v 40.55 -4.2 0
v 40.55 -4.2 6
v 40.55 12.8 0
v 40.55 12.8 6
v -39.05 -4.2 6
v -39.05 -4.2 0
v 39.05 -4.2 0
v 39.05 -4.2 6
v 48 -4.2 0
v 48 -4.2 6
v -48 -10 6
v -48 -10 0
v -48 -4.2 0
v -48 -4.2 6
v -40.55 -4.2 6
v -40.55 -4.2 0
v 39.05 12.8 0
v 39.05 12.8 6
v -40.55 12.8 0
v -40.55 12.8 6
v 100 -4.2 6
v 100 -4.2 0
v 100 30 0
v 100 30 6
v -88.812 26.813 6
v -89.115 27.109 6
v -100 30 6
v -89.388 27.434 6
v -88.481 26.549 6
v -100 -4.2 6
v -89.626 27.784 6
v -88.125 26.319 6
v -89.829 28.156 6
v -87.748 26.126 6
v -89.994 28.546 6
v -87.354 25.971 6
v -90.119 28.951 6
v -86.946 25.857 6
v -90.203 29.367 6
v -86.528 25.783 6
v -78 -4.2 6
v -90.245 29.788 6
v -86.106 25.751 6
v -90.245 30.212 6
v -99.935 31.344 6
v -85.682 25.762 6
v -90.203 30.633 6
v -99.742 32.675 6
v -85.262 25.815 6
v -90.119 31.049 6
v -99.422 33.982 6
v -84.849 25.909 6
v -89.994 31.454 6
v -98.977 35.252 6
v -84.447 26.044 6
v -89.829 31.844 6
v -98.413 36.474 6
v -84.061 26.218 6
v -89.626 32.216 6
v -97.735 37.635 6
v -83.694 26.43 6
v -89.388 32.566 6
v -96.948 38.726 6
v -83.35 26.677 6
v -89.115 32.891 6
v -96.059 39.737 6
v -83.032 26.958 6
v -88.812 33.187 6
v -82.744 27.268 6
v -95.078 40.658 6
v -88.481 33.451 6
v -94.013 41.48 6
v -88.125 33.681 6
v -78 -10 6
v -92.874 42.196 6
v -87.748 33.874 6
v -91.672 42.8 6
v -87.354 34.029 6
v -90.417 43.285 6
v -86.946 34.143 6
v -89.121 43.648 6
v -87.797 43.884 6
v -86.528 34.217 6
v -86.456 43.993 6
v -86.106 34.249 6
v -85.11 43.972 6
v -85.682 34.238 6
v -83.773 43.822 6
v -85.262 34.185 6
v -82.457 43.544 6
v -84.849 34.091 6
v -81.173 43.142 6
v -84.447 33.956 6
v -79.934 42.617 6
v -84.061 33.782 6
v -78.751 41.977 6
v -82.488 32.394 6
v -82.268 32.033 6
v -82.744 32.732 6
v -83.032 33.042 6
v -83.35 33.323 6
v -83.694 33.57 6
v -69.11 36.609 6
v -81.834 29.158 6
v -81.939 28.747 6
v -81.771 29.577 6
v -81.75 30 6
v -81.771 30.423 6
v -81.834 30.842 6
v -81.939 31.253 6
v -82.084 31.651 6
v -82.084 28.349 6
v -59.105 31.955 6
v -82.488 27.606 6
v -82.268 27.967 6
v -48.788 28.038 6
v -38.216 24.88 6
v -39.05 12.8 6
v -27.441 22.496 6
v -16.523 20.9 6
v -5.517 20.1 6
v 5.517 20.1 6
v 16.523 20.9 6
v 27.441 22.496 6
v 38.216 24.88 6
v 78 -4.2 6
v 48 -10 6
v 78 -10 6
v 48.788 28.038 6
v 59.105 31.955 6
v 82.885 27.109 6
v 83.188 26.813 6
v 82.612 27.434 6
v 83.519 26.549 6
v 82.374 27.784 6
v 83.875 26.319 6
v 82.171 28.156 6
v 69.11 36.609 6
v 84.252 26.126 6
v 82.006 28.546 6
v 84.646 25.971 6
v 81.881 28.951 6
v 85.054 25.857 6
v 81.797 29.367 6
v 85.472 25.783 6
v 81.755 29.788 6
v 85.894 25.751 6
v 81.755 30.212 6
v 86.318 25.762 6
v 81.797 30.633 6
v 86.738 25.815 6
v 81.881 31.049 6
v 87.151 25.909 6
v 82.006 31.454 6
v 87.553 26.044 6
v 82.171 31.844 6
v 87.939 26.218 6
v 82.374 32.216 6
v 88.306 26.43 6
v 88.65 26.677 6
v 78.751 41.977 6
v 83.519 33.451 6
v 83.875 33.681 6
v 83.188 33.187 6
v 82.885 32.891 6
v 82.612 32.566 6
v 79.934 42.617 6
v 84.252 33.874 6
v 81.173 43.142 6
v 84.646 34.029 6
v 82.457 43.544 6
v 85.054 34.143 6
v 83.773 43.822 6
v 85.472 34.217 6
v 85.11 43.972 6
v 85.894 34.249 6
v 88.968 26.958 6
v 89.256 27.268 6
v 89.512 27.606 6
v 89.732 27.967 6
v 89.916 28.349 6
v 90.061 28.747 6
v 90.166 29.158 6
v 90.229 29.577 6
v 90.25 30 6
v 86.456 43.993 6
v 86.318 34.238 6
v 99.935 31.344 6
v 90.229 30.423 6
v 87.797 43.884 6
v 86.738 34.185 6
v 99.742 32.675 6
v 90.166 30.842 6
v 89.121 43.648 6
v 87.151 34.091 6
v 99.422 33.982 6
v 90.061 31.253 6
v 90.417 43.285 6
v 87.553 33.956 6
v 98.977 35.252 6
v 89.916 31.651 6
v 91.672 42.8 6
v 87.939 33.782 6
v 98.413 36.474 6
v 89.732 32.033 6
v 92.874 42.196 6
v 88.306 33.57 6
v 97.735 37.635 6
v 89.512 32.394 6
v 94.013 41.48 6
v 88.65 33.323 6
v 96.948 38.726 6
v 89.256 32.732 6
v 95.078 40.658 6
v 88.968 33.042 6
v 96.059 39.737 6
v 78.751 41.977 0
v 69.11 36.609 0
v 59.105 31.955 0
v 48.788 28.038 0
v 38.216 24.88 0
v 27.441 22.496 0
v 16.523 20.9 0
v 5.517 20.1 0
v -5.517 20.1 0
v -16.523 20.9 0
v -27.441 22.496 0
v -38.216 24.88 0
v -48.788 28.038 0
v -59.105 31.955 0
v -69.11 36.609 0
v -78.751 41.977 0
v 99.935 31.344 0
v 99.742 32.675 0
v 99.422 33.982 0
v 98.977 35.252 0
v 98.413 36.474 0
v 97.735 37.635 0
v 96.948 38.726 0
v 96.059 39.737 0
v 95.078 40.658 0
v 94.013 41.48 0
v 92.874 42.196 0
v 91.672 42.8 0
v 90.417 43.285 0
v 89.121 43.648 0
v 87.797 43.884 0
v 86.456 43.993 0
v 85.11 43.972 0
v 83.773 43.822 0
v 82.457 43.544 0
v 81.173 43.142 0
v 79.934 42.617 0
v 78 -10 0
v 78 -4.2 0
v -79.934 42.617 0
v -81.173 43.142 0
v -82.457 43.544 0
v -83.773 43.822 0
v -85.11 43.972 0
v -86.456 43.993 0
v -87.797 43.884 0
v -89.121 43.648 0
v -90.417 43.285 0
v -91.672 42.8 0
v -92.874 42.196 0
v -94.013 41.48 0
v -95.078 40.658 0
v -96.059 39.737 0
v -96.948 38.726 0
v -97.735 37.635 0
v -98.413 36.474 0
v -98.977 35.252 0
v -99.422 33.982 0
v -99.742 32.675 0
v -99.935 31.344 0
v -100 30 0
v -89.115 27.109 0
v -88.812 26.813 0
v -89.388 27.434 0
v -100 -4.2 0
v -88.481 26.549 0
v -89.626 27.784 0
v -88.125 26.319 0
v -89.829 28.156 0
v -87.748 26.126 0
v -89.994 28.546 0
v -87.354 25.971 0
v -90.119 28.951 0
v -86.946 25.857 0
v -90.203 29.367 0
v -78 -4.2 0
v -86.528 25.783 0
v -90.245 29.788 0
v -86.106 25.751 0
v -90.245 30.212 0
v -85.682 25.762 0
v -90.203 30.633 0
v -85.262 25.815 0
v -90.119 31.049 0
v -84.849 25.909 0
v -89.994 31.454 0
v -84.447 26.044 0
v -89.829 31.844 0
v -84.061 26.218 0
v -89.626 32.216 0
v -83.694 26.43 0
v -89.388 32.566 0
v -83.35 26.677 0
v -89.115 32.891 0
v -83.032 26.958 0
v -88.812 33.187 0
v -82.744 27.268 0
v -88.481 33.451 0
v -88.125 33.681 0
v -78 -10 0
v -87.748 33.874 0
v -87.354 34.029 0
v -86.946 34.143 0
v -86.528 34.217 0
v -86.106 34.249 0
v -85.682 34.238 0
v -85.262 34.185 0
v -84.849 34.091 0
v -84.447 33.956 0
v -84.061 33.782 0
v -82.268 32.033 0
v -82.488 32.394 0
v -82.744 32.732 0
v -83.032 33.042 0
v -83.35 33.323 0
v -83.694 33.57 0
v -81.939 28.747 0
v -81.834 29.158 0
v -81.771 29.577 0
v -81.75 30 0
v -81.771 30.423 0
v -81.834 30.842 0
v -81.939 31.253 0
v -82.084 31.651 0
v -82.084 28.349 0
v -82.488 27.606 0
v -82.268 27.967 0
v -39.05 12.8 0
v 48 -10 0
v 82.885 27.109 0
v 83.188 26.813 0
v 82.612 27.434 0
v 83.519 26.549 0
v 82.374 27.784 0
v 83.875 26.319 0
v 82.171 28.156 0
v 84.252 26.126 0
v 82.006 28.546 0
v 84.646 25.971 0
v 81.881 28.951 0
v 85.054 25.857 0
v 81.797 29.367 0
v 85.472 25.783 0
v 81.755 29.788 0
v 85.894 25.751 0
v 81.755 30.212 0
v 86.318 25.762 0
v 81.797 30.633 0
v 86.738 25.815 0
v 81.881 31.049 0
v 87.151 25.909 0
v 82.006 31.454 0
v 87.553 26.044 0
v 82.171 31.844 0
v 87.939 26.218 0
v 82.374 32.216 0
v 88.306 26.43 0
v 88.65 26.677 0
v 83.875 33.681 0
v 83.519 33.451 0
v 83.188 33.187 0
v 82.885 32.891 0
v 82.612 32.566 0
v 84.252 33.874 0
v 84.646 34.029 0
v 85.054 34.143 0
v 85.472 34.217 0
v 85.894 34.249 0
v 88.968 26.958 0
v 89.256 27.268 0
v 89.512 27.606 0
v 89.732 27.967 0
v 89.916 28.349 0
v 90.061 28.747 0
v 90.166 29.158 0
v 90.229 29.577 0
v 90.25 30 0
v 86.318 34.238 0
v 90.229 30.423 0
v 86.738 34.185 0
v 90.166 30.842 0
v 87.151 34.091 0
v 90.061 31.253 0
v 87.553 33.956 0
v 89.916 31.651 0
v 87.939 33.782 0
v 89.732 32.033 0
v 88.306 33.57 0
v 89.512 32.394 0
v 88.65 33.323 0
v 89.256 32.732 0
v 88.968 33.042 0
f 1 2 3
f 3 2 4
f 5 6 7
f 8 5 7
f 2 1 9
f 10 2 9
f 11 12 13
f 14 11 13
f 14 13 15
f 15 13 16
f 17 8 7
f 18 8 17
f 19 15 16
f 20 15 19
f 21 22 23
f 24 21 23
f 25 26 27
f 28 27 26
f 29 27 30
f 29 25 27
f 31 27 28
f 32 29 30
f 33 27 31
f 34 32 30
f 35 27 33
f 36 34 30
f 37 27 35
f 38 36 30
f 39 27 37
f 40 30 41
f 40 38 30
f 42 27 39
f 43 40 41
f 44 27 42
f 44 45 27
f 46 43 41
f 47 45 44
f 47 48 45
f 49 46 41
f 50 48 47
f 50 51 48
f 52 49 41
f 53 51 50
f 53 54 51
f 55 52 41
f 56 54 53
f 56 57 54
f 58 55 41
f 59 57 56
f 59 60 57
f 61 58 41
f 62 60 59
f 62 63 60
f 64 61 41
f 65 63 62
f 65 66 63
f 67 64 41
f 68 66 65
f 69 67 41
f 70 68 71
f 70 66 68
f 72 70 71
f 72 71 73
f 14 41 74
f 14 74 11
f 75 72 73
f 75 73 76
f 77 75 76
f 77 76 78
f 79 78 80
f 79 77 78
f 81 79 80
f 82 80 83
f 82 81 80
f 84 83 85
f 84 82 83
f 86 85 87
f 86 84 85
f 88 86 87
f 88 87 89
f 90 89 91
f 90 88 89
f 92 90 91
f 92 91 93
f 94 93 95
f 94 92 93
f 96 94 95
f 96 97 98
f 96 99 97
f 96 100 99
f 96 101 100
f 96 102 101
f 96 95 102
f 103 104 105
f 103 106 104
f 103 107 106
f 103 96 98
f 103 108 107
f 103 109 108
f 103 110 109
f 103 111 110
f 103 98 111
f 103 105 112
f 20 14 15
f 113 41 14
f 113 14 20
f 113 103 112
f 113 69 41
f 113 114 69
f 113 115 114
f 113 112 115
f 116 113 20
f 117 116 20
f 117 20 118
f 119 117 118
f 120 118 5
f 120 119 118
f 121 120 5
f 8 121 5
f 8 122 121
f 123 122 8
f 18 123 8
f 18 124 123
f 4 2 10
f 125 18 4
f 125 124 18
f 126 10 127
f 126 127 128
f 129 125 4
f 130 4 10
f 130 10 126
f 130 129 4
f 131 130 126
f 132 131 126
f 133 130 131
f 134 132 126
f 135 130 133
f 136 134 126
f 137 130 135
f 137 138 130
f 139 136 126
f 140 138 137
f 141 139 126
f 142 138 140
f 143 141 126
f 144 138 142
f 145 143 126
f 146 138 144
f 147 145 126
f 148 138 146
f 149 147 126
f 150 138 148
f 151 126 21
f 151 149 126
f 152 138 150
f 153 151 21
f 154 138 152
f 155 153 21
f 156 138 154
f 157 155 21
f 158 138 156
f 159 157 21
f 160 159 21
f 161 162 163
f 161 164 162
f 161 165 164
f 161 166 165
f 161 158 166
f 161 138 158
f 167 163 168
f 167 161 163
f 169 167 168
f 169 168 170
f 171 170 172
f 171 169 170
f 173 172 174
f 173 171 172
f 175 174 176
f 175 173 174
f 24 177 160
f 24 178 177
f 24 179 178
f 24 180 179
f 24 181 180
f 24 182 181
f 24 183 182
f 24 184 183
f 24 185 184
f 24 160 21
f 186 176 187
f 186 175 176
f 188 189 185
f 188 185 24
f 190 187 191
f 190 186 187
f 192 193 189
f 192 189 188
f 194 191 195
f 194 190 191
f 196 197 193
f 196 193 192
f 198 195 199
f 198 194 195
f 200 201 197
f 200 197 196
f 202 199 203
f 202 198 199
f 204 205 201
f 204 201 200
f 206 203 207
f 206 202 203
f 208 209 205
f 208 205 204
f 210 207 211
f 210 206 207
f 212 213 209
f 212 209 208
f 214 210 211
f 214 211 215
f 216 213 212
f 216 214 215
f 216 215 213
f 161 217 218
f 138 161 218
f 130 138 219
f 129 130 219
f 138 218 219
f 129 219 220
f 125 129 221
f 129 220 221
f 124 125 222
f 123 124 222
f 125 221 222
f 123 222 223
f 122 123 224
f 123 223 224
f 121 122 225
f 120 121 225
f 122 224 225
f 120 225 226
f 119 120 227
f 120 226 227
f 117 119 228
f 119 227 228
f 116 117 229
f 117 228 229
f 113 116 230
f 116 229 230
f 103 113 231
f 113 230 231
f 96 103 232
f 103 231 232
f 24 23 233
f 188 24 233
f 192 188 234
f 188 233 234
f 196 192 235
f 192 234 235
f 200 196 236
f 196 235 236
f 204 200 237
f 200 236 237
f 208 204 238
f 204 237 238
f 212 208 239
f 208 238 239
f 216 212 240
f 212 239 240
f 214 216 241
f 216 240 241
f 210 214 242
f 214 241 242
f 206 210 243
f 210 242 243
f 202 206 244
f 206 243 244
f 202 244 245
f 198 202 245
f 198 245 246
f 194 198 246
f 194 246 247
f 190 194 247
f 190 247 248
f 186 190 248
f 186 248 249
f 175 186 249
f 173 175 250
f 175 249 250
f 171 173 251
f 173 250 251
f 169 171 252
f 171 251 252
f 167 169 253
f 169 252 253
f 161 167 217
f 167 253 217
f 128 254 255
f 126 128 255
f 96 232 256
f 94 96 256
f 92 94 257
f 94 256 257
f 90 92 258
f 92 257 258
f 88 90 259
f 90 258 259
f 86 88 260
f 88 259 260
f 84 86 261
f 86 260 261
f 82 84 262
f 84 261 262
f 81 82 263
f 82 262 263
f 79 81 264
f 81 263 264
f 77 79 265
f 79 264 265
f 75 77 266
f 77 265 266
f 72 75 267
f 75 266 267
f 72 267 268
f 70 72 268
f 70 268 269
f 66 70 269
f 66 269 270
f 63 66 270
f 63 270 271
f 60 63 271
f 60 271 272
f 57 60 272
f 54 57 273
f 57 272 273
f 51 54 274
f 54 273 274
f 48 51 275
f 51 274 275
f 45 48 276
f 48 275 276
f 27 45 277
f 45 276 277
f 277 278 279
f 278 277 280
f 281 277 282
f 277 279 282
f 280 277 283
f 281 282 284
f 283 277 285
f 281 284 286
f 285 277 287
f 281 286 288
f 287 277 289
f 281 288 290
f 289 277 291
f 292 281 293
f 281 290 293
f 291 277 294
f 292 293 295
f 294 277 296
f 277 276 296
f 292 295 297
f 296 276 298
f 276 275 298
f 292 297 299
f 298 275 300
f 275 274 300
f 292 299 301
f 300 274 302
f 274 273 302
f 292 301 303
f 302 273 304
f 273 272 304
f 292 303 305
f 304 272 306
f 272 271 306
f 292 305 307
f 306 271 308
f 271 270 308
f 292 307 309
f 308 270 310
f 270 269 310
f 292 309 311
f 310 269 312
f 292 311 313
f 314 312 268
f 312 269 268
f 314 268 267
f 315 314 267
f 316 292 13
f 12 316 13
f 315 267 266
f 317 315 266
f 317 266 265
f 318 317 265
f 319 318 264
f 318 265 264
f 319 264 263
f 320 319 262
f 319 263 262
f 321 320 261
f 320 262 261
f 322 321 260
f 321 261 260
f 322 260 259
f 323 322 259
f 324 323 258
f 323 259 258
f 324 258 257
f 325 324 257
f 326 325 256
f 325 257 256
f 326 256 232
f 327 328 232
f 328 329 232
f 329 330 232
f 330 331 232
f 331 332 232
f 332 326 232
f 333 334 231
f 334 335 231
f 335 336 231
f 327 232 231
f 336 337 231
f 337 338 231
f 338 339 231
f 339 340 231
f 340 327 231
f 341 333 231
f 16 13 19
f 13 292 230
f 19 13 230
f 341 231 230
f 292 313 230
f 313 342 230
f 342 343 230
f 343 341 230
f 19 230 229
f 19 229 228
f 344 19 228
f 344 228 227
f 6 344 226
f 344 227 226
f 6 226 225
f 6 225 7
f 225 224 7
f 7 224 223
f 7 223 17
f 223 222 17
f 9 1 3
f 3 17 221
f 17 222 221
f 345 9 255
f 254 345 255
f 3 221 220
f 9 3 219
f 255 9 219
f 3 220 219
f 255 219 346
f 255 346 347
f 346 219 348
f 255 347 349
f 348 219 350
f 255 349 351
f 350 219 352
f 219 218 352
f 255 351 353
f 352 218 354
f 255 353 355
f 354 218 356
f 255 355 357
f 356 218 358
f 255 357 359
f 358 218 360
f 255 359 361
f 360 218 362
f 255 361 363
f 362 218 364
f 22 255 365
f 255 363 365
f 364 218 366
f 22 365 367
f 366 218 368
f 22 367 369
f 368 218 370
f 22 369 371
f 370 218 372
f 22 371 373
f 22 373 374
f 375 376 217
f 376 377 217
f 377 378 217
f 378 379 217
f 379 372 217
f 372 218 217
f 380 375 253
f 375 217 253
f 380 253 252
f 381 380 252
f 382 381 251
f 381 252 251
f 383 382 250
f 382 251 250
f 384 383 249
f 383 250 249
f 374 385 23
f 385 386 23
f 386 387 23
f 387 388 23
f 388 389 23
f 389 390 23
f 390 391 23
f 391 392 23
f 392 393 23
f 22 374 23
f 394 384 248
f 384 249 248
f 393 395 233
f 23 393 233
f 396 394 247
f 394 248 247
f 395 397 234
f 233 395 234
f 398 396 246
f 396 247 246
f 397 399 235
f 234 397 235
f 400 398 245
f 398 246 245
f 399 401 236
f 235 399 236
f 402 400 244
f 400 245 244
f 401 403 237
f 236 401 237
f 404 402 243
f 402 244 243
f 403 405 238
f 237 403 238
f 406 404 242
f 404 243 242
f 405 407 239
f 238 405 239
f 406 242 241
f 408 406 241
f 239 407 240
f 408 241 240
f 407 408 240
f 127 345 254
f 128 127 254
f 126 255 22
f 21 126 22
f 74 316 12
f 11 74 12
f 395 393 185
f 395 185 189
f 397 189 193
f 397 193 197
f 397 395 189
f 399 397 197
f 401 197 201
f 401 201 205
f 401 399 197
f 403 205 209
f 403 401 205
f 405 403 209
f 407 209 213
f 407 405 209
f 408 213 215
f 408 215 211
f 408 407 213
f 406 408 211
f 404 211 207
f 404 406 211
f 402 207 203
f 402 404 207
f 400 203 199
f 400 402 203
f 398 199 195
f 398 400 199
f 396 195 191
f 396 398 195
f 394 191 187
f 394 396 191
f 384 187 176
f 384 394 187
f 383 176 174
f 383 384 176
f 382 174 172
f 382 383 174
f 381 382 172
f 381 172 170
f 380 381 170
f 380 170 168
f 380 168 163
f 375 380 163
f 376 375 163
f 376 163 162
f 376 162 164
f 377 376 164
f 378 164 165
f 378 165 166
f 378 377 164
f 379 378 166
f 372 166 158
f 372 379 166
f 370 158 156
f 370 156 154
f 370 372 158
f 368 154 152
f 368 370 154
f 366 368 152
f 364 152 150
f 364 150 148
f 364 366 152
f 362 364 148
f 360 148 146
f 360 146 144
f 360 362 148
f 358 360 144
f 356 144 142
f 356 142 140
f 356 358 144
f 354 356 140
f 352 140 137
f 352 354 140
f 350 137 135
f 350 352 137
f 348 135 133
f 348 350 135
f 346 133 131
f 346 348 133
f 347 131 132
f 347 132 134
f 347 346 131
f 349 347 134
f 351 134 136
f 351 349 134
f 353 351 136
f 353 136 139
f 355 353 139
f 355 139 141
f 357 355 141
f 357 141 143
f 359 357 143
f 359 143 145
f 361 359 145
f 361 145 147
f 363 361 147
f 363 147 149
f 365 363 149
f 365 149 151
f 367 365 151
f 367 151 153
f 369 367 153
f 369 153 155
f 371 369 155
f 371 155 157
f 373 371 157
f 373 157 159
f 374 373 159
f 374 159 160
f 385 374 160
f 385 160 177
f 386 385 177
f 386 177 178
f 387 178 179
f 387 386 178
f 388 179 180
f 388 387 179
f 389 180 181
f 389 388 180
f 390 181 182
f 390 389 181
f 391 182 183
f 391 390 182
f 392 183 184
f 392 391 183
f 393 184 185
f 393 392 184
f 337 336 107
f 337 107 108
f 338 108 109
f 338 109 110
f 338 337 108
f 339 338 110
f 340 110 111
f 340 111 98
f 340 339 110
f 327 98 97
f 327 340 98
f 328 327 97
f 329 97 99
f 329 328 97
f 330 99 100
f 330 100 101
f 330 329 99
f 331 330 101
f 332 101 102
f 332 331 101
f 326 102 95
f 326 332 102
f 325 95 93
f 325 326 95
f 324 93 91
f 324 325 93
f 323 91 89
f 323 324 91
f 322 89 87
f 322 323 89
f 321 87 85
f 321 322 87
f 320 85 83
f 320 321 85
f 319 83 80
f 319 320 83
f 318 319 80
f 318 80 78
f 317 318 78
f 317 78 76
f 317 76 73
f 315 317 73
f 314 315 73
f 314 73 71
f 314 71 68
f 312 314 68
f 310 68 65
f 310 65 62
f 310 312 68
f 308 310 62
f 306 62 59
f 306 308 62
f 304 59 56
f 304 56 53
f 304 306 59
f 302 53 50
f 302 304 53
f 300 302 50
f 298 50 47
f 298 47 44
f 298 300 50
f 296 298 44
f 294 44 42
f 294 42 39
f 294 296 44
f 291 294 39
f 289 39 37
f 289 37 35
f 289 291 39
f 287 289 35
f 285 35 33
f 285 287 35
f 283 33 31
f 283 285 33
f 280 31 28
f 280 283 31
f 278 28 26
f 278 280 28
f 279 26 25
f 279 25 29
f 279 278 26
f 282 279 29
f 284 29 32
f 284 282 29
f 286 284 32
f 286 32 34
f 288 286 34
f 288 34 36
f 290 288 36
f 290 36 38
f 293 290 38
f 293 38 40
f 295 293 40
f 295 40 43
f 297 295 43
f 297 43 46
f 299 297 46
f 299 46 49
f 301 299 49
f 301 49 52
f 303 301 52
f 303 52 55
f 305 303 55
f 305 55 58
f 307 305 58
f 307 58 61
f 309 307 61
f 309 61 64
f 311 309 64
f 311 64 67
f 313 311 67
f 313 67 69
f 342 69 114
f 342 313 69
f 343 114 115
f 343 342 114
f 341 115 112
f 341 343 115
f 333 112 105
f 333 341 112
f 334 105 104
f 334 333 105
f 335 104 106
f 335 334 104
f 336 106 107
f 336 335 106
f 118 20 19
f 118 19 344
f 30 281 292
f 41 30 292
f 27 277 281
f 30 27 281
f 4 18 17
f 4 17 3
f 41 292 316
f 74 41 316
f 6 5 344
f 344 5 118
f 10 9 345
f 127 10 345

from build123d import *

# Parameters (mm, degrees)
ESBO_O1_R                = 4.25
RESSALTO_EXTRUS_O1_DEPTH = 6
ESBO_O2_W                = 1.5
ESBO_O2_H                = 20
CORTE_EXTRUS_O1_DEPTH    = 25.5


with BuildPart() as part:
    # Esboço1 → Ressalto-extrusão1 (new body)
    with BuildSketch(Plane.XY):
        with BuildLine():
            ThreePointArc((-78.750627195, 41.976919217), (-92.874182887, 42.196130929), (-100, 30))
            Line((-100, 30), (-100, -4.2))
            Line((-100, -4.2), (-78, -4.2))
            Line((-78, -4.2), (-78, -10))
            Line((-78, -10), (-48, -10))
            Line((-48, -10), (-48, -4.2))
            Line((-48, -4.2), (48, -4.2))
            Line((48, -4.2), (48, -10))
            Line((48, -10), (78, -10))
            Line((78, -10), (78, -4.2))
            Line((78, -4.2), (100, -4.2))
            Line((100, -4.2), (100, 30))
            ThreePointArc((100, 30), (92.874182887, 42.196130929), (78.750627195, 41.976919217))
            ThreePointArc((78.750627195, 41.976919217), (0, 20), (-78.750627195, 41.976919217))
        make_face()
        with Locations((-86, 30)):
            Circle(ESBO_O1_R, mode=Mode.SUBTRACT)
        with Locations((86, 30)):
            Circle(ESBO_O1_R, mode=Mode.SUBTRACT)
    extrude(amount=RESSALTO_EXTRUS_O1_DEPTH)

    # Esboço2 → Corte-extrusão1 (cut)
    with BuildSketch(Plane.XY.offset(6)):
        with Locations((-39.8, 2.8)):
            Rectangle(ESBO_O2_W, ESBO_O2_H)
        with Locations((39.8, 2.8)):
            Rectangle(ESBO_O2_W, ESBO_O2_H)
    extrude(amount=-CORTE_EXTRUS_O1_DEPTH, mode=Mode.SUBTRACT)


solid = part.part
